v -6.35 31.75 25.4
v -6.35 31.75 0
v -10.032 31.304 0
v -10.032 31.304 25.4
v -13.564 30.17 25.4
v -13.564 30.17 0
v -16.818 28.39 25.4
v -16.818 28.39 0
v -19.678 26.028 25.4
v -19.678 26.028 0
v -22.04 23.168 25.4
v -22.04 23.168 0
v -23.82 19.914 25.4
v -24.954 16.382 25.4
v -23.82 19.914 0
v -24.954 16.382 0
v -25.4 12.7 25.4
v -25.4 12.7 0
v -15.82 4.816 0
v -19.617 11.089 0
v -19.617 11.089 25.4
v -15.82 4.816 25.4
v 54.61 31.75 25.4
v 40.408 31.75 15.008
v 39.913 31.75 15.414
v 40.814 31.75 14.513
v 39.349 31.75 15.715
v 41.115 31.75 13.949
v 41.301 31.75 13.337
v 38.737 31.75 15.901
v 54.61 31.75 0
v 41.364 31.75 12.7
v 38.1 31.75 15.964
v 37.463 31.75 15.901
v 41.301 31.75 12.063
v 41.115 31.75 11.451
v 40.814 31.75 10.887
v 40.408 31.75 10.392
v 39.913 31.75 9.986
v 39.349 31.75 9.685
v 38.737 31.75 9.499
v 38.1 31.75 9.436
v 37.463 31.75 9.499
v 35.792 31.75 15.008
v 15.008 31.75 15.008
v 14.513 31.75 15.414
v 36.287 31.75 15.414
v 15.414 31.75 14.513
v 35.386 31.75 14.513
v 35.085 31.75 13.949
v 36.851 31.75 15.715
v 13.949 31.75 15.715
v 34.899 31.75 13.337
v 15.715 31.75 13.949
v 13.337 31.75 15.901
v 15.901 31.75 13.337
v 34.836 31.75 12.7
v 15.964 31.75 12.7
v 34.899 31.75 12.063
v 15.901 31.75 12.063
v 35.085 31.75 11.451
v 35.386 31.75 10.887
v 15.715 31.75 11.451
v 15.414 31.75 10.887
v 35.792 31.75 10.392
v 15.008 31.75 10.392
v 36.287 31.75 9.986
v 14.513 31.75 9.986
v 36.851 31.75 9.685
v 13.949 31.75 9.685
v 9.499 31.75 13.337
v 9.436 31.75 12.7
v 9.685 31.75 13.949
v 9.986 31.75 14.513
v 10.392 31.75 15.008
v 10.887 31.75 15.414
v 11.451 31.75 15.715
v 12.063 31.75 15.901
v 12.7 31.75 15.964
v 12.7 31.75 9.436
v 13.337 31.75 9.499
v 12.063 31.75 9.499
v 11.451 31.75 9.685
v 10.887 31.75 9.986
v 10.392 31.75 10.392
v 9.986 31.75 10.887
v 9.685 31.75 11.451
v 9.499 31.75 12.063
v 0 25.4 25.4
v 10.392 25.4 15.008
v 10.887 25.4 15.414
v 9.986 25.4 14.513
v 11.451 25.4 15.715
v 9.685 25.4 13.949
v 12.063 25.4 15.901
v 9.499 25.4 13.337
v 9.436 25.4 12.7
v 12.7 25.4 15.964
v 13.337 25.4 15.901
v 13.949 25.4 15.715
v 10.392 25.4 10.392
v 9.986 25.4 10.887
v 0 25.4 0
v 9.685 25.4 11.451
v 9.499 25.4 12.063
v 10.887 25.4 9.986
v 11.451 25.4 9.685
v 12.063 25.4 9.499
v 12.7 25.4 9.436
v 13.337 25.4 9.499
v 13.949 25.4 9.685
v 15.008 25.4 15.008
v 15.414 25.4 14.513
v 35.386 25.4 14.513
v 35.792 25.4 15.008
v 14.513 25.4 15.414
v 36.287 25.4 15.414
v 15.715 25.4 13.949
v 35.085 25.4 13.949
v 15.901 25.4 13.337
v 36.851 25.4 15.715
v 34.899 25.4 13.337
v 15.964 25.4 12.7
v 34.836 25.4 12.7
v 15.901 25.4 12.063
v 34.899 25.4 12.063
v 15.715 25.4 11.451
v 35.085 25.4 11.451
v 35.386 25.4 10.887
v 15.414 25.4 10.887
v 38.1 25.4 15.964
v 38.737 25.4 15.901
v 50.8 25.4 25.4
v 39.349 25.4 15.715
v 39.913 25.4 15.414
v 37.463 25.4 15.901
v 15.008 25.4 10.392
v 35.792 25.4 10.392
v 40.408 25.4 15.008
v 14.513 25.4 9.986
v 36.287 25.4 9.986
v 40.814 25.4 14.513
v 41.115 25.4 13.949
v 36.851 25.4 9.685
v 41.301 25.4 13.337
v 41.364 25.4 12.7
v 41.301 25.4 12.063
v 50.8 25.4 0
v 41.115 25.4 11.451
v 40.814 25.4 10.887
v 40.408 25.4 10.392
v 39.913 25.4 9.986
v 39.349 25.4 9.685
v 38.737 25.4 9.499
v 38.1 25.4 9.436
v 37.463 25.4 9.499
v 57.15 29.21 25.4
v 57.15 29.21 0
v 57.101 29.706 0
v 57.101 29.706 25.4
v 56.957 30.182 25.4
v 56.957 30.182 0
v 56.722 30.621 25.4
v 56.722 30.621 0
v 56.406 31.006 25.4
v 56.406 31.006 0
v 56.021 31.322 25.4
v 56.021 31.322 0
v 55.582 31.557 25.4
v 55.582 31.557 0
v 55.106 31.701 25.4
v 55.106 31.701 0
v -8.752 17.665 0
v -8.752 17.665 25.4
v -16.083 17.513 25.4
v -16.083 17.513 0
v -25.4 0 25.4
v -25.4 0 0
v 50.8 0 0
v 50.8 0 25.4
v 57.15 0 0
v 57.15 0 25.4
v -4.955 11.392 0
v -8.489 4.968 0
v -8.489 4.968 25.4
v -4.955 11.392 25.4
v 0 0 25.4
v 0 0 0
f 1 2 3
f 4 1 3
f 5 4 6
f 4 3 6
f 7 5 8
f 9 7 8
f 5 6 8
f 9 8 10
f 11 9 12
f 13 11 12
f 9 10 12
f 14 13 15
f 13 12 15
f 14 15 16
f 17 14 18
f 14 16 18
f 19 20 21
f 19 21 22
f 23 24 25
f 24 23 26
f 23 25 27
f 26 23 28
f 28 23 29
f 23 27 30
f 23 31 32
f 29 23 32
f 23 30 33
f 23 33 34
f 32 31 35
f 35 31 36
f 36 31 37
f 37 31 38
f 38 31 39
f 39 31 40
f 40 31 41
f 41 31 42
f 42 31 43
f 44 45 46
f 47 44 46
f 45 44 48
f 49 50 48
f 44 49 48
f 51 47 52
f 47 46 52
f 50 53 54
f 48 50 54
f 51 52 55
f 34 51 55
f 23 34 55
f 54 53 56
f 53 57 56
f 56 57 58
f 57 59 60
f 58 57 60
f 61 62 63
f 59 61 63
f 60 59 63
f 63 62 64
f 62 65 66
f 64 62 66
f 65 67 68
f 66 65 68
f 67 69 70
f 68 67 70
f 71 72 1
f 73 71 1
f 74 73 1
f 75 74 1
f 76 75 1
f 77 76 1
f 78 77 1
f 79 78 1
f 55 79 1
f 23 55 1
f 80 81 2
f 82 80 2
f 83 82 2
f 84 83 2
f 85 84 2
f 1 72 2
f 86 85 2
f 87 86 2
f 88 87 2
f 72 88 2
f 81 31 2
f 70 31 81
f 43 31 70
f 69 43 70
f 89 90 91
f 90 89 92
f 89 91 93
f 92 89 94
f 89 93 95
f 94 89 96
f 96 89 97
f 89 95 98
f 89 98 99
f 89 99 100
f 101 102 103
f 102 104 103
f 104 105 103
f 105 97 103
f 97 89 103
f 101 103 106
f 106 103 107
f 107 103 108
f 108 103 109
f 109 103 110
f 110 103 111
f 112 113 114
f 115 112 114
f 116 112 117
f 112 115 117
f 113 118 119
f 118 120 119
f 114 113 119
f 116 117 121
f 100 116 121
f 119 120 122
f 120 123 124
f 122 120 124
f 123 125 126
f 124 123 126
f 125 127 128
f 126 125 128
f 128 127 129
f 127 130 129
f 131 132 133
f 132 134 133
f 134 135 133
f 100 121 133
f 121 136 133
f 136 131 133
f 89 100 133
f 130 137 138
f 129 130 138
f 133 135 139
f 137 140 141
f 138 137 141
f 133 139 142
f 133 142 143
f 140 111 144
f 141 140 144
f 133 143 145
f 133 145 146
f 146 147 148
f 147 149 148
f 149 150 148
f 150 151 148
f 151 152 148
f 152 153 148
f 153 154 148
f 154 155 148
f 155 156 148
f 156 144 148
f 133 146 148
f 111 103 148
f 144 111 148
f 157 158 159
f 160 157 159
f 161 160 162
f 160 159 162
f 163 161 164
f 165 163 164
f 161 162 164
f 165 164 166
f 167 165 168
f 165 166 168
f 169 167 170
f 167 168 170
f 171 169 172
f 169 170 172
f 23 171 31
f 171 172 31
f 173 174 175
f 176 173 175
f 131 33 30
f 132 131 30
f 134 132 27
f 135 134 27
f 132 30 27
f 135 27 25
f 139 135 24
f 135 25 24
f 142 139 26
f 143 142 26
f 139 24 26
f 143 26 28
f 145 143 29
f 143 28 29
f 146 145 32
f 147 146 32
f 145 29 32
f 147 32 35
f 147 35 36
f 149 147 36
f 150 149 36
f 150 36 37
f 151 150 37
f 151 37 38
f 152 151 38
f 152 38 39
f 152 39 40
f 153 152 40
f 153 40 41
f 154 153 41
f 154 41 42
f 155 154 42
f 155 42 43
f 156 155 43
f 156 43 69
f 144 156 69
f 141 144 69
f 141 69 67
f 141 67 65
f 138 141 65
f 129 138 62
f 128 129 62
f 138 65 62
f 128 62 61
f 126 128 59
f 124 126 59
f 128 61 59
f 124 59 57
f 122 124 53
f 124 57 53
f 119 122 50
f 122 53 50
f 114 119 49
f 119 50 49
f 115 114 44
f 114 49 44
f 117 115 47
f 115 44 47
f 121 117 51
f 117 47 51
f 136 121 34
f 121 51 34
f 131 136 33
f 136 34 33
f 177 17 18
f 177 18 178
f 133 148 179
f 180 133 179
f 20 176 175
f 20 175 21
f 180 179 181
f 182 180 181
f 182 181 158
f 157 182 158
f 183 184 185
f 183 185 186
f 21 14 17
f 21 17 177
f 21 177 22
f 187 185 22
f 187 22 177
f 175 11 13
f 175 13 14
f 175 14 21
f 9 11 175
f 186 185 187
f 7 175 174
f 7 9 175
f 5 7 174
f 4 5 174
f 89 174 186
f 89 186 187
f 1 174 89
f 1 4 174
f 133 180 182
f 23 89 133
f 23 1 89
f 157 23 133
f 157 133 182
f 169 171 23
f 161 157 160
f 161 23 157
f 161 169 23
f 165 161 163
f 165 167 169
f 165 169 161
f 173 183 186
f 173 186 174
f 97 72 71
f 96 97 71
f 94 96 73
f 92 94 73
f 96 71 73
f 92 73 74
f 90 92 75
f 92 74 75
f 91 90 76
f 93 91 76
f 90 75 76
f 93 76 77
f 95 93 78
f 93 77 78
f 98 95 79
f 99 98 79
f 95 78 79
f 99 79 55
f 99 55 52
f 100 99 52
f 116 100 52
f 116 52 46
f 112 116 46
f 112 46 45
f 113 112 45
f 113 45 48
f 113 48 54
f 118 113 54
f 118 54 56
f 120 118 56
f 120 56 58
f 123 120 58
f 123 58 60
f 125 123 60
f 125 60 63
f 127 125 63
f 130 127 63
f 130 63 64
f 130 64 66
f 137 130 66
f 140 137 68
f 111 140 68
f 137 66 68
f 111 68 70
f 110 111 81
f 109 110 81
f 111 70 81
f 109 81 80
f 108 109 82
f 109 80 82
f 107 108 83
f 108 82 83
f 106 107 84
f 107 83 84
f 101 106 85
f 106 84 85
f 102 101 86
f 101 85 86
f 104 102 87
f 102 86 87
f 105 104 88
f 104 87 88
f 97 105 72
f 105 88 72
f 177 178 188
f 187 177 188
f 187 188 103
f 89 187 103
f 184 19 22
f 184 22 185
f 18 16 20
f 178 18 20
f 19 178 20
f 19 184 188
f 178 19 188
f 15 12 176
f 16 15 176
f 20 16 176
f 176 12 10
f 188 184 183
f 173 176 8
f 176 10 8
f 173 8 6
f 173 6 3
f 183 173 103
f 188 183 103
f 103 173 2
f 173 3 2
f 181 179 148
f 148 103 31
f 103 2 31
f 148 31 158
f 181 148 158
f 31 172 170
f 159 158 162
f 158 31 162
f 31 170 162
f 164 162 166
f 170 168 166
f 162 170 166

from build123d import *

# Parameters (mm, degrees)
BOSS_EXTRUDE2_DEPTH = 25.4
SKETCH2_R           = 3.2639
CUT_EXTRUDE1_DEPTH  = 71.138042459


with BuildPart() as part:
    # Sketch1 → Boss-Extrude2 (new body)
    with BuildSketch(Plane.XY):
        with BuildLine():
            Line((50.8, 0), (57.15, 0))
            Line((57.15, 0), (57.15, 29.21))
            ThreePointArc((57.15, 29.21), (56.406051224, 31.006051224), (54.61, 31.75))
            Line((54.61, 31.75), (-6.35, 31.75))
            ThreePointArc((-6.35, 31.75), (-19.678174928, 26.028174928), (-25.4, 12.7))
            Line((-25.4, 12.7), (-25.4, 0))
            Line((-25.4, 0), (0, 0))
            Line((0, 0), (0, 25.4))
            Line((0, 25.4), (50.8, 25.4))
            Line((50.8, 25.4), (50.8, 0))
        make_face()
        Polygon((-8.489396689, 4.967655623), (-4.955326016, 11.392114963), (-8.752035673, 17.664939614), (-16.082816004, 17.513304926), (-19.616886677, 11.088845586), (-15.820177019, 4.816020934), align=None, mode=Mode.SUBTRACT)
    extrude(amount=BOSS_EXTRUDE2_DEPTH)

    # Sketch2 → Cut-Extrude1 (cut, through all)
    with BuildSketch(Plane(origin=(0, 31.75, 0), x_dir=(1, 0, 0), z_dir=(0, 1, 0))):
        with Locations(Location((12.7, -12.7, 0), (0, 0, 180))):
            Circle(SKETCH2_R)
        with Locations(Location((38.1, -12.7, 0), (0, 0, 270))):
            Circle(SKETCH2_R)
    extrude(amount=-CUT_EXTRUDE1_DEPTH, mode=Mode.SUBTRACT)


solid = part.part
